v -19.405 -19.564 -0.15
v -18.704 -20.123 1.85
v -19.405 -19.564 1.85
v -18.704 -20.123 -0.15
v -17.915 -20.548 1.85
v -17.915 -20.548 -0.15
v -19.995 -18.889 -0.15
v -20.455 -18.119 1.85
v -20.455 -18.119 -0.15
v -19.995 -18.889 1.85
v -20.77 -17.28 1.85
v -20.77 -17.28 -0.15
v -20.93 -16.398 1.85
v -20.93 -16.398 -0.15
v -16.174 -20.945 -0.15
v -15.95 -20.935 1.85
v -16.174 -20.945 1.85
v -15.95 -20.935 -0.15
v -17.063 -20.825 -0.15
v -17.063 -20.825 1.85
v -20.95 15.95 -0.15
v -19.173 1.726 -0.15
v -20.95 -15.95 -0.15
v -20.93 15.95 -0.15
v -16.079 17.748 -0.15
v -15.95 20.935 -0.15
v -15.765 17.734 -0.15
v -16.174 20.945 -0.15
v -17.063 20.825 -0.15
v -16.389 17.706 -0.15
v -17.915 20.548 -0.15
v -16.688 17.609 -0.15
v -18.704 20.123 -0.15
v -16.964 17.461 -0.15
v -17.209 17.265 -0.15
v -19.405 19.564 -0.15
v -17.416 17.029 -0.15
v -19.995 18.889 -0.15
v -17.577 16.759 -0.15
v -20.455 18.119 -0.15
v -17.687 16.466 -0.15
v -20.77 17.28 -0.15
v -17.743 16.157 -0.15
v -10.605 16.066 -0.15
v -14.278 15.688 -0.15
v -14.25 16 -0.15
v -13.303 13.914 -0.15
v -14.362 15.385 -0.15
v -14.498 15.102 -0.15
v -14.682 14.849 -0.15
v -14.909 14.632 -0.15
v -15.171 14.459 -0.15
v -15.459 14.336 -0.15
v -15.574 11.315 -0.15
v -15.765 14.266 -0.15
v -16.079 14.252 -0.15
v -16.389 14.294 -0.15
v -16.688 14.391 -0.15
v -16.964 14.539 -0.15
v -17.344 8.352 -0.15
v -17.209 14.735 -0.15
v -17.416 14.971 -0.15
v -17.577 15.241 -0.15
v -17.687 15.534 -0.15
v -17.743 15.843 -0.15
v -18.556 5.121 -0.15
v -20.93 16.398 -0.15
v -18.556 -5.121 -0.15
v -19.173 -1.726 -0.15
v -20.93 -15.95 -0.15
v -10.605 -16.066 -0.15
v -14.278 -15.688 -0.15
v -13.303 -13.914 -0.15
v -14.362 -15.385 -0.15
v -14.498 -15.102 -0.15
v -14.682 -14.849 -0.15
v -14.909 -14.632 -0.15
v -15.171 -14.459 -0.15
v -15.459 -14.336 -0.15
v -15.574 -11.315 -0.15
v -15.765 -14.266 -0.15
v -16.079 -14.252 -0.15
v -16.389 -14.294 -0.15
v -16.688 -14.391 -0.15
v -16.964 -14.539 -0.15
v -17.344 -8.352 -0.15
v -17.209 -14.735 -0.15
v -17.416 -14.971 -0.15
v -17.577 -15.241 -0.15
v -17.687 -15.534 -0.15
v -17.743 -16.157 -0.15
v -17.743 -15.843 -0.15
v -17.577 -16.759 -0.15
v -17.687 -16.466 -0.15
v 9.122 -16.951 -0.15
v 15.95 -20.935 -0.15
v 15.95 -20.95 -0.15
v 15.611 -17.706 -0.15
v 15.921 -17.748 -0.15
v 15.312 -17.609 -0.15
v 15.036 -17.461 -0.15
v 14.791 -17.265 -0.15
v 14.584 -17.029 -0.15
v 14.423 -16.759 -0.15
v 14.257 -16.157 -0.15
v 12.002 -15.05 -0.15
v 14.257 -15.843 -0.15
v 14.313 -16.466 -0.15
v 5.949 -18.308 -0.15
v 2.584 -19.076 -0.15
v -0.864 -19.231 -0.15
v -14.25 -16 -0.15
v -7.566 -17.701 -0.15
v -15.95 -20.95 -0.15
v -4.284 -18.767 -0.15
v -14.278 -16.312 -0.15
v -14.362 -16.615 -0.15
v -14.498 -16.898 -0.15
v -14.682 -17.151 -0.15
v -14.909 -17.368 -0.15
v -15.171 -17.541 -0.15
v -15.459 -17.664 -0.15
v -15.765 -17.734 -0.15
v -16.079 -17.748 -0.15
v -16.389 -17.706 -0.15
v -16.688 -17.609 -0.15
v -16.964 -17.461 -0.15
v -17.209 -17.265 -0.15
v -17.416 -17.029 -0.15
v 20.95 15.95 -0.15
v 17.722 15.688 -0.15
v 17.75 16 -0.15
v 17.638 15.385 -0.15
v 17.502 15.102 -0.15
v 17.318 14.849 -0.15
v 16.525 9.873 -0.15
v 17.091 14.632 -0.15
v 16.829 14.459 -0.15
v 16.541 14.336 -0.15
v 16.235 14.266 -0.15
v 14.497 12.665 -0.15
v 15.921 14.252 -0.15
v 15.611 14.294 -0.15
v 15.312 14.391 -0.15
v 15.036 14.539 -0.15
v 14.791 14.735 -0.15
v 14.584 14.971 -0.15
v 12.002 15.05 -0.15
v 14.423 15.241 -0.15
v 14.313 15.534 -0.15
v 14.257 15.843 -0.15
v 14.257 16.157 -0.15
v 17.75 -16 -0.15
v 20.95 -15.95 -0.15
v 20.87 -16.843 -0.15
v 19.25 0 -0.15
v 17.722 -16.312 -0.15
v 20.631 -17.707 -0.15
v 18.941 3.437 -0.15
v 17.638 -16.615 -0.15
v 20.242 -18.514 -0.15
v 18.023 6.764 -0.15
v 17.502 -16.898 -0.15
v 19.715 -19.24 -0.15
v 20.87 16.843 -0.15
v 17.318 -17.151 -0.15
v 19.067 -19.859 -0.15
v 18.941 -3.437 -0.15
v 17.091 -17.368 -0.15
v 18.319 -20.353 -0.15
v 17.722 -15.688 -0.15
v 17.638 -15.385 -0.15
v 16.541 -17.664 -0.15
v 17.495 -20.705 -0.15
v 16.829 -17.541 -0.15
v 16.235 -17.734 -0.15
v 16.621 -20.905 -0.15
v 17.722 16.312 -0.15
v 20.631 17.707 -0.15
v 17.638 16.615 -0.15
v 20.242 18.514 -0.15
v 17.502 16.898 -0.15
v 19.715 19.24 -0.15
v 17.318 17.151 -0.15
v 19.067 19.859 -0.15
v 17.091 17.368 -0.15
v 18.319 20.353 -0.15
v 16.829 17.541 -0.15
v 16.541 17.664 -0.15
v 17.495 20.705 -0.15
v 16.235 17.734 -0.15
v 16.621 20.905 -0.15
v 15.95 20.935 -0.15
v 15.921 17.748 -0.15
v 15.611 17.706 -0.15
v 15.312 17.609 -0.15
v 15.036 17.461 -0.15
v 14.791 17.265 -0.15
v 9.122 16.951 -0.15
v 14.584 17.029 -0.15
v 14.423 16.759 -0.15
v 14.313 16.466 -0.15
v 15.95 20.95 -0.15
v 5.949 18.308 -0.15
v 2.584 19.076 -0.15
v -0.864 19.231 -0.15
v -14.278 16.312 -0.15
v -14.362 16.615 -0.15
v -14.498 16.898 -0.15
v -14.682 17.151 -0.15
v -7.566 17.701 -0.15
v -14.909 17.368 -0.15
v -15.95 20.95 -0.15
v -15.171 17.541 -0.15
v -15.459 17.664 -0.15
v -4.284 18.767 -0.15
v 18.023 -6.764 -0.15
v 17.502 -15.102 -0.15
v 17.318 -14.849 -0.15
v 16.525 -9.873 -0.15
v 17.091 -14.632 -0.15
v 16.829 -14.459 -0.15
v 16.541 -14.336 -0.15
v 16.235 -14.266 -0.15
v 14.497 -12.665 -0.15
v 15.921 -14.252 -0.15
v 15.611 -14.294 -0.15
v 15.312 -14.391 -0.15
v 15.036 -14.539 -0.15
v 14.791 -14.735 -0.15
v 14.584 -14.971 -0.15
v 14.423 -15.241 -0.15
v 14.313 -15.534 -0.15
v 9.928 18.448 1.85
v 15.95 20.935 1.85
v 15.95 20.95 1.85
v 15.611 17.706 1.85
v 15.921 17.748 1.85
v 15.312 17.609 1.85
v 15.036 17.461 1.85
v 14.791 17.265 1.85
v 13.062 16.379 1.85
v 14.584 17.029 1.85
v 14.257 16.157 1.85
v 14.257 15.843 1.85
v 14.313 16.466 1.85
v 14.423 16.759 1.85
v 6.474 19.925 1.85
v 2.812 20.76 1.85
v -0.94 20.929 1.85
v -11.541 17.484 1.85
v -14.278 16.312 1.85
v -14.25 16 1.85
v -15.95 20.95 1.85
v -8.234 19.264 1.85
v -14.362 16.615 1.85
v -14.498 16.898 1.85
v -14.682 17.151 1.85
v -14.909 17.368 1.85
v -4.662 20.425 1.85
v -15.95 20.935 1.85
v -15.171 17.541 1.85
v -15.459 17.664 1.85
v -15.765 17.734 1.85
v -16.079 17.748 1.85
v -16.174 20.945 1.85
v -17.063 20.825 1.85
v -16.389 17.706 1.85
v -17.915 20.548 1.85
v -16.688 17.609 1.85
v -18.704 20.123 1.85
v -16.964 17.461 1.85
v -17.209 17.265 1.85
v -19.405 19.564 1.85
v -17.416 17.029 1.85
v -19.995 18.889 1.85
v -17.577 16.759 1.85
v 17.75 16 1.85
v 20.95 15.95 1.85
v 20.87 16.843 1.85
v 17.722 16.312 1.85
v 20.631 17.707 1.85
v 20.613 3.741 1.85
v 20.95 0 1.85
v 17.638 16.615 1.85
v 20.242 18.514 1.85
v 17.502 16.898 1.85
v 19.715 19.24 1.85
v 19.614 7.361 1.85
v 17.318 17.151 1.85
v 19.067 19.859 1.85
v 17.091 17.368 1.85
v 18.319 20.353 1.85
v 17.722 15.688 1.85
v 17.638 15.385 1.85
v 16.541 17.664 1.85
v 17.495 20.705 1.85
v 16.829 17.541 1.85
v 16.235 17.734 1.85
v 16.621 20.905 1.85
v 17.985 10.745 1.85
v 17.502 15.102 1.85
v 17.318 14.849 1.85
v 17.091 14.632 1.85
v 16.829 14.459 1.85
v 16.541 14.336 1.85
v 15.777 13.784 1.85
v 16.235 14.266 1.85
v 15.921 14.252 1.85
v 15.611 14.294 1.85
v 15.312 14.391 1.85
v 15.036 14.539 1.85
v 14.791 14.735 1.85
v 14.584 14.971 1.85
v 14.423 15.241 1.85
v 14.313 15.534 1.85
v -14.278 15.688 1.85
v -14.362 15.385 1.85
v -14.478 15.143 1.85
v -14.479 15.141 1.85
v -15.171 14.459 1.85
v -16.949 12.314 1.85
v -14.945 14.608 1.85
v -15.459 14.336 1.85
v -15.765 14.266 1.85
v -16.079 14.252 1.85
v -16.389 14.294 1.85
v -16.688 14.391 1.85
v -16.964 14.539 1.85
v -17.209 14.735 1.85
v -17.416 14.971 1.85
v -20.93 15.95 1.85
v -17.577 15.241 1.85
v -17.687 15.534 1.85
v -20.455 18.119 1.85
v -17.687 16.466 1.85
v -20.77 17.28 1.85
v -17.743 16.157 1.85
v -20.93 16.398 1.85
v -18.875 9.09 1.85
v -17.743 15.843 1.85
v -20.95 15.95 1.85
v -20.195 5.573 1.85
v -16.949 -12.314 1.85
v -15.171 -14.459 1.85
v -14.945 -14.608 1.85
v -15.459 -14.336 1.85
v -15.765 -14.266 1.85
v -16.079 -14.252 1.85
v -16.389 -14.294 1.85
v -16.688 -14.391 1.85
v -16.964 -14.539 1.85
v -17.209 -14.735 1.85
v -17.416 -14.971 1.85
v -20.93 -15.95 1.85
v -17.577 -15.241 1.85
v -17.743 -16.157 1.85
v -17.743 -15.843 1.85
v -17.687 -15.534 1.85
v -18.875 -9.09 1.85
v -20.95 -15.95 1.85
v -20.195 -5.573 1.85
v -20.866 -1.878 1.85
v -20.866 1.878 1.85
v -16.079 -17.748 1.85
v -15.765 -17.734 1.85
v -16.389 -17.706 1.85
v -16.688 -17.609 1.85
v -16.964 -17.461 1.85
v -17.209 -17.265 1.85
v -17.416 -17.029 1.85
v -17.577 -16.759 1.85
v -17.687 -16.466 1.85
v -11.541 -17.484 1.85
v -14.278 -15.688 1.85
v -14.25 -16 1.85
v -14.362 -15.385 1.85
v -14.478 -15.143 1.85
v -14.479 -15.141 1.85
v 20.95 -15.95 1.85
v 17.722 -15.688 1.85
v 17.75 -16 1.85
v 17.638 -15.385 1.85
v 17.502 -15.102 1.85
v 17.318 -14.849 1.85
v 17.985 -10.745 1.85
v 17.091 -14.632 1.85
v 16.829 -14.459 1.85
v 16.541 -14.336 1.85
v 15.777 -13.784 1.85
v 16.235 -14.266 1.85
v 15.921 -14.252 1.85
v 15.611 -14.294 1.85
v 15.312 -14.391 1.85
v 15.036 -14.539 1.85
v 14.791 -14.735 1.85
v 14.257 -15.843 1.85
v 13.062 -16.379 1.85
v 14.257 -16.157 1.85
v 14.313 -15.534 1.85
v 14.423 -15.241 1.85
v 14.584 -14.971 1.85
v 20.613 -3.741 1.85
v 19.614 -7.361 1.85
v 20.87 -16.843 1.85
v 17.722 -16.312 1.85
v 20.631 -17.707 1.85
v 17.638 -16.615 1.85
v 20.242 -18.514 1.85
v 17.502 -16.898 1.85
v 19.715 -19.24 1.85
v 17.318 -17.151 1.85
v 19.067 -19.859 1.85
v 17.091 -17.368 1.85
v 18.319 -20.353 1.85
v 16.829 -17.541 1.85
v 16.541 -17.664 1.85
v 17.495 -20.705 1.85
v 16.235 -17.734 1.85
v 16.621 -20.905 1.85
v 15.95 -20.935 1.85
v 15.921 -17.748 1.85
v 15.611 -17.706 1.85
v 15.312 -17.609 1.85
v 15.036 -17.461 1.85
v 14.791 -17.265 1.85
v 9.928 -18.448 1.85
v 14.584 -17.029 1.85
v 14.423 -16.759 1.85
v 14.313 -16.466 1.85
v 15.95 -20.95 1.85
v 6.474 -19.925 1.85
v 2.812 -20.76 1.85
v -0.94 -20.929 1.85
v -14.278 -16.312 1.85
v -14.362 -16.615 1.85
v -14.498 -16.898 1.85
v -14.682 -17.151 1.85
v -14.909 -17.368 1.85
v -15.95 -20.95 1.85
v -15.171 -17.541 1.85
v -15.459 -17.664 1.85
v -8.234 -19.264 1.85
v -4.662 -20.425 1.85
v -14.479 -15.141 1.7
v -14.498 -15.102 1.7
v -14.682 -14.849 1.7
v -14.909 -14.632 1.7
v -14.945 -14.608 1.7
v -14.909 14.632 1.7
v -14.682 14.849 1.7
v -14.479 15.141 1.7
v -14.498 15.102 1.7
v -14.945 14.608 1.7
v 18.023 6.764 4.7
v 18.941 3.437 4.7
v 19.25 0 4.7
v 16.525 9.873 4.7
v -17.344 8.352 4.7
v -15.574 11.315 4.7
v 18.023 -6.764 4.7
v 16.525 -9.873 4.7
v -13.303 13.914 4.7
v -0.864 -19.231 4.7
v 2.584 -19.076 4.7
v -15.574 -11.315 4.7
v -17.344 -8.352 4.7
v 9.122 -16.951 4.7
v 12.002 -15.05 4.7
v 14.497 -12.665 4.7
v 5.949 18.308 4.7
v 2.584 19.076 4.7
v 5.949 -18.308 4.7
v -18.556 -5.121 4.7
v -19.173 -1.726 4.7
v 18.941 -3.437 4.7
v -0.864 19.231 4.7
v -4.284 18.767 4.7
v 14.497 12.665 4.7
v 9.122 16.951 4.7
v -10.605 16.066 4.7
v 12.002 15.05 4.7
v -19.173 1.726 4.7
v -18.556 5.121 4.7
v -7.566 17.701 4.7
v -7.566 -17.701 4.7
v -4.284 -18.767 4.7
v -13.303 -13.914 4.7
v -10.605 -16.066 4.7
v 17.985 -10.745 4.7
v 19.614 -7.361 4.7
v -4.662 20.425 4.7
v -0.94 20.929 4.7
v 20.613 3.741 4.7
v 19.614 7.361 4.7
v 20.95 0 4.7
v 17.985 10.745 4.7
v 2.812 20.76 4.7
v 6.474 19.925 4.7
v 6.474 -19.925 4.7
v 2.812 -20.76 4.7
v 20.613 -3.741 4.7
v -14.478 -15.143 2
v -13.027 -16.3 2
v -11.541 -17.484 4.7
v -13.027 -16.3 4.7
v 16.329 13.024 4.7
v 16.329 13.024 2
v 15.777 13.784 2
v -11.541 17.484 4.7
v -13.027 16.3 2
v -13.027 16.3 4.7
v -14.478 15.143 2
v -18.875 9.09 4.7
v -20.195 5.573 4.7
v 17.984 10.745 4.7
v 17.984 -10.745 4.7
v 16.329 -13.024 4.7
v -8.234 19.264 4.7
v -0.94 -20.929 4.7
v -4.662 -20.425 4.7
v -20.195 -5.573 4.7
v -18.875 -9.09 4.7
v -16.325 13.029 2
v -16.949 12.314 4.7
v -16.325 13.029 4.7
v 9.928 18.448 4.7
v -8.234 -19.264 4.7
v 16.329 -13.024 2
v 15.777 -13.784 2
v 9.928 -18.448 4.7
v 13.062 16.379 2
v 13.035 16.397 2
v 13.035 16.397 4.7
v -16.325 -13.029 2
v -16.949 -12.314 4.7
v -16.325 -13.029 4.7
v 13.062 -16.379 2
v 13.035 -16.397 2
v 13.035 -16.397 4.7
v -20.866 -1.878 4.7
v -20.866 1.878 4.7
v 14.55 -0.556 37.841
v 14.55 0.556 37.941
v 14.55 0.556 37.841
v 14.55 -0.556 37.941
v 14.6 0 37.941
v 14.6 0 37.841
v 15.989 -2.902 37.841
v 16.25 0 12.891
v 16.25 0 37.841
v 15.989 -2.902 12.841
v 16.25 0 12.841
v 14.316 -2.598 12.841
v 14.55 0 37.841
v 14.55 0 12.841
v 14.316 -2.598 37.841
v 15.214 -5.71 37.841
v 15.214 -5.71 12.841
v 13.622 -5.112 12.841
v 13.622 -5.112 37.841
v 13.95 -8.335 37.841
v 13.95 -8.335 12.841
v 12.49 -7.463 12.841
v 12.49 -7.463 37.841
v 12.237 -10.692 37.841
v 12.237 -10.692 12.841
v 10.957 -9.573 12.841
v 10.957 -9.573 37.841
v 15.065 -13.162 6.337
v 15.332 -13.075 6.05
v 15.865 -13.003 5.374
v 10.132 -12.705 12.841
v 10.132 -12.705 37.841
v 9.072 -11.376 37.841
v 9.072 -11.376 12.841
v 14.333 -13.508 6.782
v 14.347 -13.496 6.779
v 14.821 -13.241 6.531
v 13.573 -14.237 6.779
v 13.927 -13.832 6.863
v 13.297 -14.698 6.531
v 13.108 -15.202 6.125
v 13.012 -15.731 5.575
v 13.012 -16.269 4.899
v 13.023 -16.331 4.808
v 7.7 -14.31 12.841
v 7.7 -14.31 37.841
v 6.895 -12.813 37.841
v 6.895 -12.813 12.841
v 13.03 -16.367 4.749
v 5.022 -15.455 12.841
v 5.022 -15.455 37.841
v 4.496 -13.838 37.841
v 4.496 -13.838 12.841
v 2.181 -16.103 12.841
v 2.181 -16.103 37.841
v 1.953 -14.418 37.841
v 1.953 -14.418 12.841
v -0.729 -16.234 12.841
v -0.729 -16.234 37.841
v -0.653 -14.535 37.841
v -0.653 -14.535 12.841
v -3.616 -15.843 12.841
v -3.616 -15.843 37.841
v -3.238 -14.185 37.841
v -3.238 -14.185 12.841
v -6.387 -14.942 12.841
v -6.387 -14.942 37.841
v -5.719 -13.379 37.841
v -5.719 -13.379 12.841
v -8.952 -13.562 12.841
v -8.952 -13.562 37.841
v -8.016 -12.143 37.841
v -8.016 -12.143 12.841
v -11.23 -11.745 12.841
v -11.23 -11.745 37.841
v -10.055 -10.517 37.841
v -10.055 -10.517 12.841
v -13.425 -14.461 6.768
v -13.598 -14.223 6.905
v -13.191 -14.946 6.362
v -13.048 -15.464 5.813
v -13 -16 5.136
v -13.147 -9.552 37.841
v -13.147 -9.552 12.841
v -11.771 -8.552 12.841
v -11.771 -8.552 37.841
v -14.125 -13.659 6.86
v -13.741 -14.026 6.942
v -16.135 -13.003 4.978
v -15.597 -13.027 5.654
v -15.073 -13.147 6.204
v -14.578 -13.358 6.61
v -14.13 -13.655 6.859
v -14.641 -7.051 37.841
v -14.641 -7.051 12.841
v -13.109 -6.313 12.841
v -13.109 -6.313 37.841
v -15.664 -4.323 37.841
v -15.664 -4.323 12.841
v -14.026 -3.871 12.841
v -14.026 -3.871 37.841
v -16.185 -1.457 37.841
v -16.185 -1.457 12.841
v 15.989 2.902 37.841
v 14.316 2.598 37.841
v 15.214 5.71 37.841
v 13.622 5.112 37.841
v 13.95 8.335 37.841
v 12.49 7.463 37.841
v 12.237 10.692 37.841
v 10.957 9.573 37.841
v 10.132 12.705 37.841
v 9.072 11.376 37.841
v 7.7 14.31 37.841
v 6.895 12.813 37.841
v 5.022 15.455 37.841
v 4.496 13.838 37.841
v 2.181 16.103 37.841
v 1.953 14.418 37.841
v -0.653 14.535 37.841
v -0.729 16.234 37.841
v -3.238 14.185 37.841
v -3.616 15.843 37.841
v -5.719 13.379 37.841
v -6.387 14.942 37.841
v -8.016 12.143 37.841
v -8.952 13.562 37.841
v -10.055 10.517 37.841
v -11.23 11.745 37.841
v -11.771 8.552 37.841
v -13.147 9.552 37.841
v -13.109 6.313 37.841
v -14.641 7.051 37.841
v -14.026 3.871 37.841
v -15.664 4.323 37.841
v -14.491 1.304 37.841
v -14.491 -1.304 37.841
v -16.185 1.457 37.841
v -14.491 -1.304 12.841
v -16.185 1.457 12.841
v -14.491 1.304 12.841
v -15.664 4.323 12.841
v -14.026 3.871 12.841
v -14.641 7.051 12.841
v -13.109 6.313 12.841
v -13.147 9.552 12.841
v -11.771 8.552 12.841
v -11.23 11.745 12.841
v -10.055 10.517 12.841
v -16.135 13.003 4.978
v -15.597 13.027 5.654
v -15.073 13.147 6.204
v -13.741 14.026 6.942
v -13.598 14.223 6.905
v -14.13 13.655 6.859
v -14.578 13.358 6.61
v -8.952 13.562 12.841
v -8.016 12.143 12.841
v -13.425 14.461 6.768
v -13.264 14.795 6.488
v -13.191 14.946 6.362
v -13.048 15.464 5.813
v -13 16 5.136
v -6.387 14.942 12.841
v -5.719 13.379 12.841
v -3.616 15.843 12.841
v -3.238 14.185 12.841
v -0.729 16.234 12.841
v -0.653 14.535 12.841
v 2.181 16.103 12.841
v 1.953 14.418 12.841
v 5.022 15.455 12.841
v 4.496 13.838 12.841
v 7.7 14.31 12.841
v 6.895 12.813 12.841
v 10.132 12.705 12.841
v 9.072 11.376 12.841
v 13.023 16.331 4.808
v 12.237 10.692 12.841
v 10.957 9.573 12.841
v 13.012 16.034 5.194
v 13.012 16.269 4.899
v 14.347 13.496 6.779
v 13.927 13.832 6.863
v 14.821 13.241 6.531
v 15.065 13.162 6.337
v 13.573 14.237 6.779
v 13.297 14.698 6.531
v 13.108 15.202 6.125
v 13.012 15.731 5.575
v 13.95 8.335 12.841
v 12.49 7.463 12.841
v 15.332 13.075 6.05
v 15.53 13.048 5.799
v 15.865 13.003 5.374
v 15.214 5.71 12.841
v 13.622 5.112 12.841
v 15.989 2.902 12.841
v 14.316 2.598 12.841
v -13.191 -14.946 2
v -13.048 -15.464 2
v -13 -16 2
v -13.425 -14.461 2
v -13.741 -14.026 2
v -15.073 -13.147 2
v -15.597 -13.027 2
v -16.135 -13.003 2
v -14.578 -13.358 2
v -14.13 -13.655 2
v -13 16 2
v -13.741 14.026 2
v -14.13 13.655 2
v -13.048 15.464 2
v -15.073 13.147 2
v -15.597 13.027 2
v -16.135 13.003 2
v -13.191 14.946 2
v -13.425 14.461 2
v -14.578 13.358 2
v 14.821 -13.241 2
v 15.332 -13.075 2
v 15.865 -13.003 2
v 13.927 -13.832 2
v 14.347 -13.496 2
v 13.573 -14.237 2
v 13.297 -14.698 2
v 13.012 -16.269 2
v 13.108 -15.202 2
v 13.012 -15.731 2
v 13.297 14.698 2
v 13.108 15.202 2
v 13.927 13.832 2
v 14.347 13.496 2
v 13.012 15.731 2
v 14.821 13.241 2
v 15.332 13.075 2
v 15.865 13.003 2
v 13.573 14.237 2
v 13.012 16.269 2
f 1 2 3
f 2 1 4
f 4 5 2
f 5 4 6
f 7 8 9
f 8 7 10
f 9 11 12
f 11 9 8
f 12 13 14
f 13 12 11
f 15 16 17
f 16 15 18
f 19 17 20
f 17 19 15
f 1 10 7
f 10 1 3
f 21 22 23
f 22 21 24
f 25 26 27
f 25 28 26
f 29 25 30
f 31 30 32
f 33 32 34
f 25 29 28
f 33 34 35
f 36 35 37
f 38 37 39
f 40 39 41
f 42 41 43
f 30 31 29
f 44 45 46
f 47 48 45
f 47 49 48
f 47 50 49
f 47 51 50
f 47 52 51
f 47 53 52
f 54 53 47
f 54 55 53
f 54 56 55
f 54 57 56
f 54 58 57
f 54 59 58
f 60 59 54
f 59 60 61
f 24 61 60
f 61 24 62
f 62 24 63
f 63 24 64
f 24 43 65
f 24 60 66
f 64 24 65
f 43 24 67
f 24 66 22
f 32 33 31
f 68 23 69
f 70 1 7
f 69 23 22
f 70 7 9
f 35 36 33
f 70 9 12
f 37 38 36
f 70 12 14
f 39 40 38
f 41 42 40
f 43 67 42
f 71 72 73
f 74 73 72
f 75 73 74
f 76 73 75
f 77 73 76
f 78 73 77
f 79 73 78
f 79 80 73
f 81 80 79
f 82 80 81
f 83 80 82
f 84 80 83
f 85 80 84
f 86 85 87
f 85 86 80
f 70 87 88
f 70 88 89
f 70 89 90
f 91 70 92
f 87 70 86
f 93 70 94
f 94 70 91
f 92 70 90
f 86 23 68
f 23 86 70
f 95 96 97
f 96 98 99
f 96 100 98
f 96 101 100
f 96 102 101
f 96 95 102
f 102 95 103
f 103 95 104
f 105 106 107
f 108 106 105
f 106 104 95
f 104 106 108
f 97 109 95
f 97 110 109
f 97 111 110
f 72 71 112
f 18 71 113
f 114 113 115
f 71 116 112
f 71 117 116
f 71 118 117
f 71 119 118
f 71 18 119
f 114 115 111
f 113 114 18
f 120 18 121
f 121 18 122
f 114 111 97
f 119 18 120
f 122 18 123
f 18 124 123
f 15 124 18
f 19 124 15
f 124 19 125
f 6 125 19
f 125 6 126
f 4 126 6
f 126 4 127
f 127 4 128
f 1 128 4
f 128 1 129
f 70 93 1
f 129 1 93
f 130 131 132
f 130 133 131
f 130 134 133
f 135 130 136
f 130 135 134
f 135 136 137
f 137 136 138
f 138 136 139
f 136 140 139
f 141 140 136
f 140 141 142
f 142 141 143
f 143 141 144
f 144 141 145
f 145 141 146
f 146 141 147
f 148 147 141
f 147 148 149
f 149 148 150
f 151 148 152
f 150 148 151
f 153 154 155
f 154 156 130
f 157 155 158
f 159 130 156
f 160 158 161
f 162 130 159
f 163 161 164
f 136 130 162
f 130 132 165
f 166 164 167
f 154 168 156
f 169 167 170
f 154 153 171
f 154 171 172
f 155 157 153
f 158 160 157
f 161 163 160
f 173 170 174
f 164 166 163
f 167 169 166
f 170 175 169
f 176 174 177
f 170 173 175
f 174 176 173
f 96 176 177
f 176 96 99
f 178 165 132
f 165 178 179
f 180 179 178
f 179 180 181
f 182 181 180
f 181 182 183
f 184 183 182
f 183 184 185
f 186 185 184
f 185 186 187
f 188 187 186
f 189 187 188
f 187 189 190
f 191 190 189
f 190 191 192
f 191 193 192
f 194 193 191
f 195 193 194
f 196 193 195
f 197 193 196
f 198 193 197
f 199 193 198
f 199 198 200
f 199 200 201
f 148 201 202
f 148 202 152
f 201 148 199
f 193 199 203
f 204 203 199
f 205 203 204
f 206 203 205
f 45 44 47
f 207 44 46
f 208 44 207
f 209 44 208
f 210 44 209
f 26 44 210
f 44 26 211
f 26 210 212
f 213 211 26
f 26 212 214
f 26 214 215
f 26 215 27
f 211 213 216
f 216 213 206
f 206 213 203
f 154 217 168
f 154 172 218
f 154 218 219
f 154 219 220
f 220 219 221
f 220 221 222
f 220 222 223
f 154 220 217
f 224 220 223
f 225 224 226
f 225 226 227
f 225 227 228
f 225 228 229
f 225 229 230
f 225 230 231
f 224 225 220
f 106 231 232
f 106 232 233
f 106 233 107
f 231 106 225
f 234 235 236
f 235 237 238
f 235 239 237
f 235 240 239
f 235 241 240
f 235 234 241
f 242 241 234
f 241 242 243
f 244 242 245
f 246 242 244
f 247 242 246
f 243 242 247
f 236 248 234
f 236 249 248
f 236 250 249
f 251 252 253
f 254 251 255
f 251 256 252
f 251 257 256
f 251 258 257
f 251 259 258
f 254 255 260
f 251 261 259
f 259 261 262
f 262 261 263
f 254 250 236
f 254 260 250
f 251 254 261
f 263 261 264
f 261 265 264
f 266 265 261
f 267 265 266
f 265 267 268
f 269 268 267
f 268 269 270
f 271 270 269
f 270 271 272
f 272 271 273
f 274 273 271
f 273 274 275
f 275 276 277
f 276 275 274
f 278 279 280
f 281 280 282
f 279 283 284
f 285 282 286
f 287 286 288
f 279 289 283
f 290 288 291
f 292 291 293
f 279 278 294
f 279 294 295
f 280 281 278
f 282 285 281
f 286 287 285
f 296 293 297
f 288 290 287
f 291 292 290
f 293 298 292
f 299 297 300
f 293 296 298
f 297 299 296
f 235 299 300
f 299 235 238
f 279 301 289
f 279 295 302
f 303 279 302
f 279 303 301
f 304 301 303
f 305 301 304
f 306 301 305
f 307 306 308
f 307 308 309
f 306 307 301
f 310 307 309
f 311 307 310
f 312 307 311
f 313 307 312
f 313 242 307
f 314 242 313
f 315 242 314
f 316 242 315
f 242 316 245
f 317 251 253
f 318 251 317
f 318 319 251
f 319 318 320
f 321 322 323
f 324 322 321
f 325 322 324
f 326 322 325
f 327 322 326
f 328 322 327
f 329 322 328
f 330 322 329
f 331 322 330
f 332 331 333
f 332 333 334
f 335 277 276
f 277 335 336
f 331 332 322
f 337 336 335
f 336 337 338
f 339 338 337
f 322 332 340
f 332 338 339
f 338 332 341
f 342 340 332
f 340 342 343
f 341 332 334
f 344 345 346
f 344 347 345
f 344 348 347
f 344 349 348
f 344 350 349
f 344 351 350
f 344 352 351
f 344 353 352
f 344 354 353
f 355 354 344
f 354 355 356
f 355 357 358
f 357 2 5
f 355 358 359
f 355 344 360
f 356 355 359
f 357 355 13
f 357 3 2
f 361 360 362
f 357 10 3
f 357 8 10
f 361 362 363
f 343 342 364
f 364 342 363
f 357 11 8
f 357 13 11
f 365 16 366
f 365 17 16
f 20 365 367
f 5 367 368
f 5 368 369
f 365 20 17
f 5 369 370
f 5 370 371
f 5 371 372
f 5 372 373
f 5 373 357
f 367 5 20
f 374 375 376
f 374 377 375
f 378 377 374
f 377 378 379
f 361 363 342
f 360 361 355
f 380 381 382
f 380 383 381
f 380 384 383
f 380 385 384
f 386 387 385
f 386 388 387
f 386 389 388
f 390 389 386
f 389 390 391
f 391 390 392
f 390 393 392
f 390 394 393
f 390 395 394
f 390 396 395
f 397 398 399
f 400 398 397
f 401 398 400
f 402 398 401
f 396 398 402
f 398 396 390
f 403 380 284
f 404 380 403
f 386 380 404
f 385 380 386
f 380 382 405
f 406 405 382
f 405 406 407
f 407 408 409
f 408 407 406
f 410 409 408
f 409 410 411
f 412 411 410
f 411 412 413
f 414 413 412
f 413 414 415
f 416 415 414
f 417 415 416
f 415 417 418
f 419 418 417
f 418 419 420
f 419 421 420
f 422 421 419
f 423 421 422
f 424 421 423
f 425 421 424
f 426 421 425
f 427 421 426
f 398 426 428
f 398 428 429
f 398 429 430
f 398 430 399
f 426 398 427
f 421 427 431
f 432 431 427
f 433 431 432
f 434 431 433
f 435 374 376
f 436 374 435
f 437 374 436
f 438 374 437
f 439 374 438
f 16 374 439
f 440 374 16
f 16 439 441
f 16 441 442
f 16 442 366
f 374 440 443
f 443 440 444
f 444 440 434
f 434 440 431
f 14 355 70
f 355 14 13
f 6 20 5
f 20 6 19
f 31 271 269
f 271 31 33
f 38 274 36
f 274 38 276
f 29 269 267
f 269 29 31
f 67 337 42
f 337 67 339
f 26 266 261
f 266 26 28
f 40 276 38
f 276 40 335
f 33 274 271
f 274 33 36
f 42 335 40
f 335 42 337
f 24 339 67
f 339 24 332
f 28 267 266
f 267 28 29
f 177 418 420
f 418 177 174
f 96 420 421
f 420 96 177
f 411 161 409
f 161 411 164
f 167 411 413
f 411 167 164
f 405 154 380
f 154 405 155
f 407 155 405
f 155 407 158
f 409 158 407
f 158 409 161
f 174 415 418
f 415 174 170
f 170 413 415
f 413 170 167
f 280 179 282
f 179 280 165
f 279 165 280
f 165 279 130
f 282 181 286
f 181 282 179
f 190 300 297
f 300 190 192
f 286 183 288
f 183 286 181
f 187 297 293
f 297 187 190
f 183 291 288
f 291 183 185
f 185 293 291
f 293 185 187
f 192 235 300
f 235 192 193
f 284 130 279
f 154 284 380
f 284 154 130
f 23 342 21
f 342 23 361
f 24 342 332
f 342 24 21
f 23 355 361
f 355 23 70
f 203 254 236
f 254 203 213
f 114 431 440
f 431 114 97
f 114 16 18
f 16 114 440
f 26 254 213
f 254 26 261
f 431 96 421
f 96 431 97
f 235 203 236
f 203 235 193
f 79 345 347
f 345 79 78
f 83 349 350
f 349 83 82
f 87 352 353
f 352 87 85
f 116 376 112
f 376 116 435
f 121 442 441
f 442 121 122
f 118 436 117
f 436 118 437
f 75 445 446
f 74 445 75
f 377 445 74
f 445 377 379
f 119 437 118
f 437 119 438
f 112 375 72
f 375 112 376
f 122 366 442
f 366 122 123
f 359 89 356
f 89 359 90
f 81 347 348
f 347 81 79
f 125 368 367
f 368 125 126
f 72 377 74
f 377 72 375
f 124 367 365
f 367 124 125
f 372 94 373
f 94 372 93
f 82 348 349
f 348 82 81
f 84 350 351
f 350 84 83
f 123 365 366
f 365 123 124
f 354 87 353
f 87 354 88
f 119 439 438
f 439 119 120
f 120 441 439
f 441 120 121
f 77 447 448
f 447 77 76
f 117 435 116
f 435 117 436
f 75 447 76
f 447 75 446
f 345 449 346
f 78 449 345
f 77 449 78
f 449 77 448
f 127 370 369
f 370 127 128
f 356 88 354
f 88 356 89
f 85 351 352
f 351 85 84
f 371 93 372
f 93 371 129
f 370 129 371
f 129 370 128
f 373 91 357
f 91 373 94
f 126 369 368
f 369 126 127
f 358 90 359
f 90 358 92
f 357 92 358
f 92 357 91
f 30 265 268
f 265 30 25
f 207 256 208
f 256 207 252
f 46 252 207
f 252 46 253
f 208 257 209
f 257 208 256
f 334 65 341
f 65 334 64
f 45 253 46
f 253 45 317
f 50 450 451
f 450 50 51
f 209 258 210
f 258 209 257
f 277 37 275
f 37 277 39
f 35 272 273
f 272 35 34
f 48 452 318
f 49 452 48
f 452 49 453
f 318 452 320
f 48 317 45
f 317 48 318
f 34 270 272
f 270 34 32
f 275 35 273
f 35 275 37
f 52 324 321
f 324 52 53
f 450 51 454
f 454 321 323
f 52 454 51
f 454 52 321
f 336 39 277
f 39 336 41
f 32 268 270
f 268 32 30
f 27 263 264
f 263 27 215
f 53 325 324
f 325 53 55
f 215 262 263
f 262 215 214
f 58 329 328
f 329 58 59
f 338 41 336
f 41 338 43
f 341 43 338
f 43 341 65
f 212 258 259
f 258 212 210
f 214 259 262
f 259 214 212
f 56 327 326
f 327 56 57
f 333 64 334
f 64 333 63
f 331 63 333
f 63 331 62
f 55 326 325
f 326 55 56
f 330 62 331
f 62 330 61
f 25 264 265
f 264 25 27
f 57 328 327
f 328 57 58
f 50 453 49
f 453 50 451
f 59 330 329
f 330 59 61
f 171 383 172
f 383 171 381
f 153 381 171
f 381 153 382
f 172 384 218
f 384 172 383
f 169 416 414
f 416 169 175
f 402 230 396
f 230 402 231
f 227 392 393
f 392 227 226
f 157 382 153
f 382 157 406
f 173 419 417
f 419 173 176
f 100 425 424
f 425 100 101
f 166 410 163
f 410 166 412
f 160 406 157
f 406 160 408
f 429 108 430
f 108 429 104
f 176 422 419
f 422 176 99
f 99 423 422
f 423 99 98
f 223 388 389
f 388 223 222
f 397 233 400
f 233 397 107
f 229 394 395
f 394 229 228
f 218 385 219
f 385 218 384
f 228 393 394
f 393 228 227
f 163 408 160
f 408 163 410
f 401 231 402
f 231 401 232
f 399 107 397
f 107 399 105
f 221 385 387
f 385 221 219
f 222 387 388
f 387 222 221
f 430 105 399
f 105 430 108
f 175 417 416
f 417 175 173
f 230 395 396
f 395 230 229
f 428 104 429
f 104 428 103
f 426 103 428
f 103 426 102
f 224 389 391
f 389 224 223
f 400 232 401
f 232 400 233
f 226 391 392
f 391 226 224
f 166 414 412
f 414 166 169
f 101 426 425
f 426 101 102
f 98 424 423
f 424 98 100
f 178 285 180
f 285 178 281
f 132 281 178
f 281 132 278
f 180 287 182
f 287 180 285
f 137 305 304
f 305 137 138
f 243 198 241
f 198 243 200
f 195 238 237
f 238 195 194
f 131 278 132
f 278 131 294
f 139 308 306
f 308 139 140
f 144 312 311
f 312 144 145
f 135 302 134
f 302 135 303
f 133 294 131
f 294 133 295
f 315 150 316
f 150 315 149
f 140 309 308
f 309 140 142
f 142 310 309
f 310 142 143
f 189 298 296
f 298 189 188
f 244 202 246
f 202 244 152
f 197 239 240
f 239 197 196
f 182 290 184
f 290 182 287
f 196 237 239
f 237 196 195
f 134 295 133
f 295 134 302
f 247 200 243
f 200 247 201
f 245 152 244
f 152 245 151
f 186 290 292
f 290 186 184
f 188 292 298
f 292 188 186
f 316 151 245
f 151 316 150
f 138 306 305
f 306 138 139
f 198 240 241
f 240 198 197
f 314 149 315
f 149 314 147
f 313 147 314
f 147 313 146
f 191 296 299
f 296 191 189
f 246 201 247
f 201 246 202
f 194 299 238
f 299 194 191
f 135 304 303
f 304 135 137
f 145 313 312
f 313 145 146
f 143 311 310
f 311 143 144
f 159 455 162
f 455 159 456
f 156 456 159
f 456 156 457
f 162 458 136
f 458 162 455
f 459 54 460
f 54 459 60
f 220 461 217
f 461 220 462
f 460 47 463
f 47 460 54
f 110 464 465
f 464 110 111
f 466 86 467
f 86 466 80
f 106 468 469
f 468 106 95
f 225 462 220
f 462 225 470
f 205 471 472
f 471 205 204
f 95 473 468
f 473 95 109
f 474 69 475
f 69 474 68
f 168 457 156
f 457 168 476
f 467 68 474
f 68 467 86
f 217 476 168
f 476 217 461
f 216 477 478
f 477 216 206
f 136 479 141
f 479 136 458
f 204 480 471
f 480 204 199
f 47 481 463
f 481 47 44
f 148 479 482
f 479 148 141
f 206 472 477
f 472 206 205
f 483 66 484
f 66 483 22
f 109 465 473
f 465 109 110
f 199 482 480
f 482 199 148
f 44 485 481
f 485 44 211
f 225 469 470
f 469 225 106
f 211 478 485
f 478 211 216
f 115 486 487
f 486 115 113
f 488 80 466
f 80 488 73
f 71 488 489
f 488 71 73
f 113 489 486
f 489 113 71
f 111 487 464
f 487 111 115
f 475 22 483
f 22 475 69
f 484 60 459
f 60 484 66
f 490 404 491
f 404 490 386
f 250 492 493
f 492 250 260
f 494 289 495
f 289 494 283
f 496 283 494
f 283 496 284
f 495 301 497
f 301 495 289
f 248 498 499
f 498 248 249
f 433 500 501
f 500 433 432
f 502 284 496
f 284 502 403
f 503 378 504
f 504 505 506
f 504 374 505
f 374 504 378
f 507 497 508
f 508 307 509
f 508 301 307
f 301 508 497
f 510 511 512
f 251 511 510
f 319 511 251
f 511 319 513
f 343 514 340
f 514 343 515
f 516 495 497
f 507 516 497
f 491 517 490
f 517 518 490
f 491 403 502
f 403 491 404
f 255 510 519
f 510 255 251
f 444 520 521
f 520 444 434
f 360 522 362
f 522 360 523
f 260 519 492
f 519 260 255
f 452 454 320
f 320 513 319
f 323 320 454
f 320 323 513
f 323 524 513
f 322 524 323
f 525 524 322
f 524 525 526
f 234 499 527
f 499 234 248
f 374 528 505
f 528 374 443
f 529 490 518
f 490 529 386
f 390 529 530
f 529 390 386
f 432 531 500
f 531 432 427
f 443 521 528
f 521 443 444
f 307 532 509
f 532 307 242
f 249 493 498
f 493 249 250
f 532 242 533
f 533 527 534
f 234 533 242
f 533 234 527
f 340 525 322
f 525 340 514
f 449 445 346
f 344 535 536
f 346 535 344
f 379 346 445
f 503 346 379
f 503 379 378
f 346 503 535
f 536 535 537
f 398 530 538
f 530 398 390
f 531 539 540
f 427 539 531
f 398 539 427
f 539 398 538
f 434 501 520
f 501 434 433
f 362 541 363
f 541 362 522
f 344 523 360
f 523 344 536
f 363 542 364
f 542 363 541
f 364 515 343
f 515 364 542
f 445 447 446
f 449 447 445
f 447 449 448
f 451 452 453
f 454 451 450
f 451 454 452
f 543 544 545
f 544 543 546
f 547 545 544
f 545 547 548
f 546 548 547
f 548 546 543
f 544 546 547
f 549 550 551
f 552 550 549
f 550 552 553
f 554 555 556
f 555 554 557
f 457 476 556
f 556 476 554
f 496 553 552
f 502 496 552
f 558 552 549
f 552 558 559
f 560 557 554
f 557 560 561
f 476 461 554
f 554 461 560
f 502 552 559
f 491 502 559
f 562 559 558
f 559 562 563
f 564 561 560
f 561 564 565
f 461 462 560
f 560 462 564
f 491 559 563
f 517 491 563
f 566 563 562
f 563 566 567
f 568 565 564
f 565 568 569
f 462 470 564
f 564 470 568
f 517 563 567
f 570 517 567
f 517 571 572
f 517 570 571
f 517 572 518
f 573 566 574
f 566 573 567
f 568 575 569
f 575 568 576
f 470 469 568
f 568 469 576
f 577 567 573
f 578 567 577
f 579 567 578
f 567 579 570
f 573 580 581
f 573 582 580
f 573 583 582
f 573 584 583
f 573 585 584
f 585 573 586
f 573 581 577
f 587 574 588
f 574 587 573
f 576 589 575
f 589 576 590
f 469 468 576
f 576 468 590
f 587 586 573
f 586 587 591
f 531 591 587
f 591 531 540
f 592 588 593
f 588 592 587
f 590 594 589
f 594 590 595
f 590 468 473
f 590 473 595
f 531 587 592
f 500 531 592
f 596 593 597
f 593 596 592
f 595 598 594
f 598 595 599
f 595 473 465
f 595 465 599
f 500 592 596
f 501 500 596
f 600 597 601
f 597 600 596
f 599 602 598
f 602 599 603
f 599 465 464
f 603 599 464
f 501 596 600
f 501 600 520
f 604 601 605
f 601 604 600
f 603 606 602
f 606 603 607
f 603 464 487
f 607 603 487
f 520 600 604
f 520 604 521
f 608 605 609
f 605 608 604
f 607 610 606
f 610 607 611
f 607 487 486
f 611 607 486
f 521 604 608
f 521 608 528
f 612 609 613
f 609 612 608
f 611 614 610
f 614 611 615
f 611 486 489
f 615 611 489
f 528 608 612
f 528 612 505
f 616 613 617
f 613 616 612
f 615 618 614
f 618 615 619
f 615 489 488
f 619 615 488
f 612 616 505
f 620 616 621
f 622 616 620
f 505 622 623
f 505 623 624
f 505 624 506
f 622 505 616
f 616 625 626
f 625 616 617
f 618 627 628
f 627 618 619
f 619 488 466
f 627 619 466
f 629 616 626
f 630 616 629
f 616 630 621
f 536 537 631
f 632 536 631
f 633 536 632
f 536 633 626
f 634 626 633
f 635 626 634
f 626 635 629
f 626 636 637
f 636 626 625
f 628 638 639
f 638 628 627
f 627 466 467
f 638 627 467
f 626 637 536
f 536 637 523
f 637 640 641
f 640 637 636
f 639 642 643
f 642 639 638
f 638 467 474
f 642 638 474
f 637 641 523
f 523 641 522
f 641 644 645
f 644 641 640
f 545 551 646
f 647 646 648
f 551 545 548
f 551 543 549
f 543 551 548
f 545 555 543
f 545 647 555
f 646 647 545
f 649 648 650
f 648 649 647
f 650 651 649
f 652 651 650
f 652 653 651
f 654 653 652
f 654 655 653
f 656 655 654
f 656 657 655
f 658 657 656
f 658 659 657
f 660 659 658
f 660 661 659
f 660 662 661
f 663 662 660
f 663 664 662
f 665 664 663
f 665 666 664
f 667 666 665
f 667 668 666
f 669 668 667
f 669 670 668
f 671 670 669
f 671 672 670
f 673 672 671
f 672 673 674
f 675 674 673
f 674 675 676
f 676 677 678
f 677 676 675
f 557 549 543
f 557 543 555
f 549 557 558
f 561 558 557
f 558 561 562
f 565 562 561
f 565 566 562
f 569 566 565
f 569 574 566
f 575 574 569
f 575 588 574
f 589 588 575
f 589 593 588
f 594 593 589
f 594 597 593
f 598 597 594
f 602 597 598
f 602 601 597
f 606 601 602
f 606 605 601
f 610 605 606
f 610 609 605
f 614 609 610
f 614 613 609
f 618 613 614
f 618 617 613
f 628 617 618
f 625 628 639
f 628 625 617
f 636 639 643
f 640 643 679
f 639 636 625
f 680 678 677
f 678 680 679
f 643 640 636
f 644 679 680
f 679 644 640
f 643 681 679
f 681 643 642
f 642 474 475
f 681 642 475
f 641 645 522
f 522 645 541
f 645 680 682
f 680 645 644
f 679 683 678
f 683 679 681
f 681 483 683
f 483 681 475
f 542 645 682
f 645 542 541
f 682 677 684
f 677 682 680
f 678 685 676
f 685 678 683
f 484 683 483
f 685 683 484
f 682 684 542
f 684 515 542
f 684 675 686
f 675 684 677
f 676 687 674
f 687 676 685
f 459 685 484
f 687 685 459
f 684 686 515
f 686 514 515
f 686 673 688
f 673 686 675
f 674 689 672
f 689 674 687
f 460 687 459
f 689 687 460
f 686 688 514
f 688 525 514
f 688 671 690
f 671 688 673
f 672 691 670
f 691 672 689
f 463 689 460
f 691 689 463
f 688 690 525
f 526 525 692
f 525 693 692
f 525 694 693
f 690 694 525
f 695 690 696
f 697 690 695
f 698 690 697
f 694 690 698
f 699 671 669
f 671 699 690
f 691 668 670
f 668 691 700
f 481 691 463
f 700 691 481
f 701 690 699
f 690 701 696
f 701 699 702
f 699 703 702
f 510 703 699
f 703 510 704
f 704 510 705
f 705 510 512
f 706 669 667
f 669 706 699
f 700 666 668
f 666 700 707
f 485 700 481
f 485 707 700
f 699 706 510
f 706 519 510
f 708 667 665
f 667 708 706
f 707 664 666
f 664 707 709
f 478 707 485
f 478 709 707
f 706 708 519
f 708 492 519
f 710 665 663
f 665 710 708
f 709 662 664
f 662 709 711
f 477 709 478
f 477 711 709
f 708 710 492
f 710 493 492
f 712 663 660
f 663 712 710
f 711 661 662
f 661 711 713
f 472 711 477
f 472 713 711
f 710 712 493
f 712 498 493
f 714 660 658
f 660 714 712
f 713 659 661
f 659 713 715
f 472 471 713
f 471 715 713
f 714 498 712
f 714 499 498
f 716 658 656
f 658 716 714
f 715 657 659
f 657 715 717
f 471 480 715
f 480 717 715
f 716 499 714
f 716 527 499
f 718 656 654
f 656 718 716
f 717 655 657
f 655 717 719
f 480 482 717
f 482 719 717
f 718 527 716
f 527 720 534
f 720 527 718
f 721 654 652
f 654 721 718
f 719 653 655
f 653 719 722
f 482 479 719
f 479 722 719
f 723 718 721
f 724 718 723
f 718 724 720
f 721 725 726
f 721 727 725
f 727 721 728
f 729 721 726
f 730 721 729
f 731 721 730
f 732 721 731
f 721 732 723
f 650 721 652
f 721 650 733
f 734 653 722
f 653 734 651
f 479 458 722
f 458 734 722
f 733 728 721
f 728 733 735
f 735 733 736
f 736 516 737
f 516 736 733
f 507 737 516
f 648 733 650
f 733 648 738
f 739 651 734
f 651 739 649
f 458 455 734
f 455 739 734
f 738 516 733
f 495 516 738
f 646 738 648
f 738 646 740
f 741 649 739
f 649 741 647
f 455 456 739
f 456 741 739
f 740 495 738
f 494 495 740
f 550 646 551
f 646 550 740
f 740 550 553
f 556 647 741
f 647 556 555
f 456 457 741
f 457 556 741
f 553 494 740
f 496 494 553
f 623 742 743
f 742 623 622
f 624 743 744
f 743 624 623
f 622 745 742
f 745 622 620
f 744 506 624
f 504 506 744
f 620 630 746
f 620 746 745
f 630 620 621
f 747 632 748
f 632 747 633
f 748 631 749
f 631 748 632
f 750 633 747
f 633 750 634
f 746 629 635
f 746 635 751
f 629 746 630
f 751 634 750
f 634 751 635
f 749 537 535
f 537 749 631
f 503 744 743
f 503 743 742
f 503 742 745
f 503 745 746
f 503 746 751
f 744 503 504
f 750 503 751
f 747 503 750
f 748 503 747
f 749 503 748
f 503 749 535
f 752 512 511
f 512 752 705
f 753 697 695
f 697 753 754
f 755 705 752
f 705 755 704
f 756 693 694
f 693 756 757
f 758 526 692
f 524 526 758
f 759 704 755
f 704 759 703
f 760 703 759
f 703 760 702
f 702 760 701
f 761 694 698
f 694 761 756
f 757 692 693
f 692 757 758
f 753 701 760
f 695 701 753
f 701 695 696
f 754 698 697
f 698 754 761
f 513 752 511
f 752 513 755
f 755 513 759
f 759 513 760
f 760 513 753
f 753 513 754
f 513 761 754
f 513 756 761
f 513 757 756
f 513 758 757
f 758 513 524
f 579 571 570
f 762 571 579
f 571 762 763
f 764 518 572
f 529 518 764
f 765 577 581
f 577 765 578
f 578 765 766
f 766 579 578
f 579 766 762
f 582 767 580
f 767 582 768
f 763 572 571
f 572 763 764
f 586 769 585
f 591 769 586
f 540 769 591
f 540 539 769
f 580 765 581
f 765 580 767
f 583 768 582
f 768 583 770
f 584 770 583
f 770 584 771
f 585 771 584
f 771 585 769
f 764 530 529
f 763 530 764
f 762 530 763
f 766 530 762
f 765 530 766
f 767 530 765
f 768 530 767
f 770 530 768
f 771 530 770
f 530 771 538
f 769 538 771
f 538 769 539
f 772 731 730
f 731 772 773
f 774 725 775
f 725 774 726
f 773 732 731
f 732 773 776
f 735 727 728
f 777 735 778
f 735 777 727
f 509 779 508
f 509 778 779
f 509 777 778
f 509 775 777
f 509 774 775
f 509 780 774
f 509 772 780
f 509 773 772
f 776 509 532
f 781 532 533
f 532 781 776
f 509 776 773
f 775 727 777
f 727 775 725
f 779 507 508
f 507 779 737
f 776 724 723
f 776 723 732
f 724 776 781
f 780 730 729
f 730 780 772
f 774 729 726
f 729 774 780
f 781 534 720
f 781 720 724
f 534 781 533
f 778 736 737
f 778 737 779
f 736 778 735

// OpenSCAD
// [FL_INDEX: keywords="openscad, 3d_parametric, Tube_Adapter_Flange_with_Optional_Grating__Parametric, csg_solid" | COT="Parametric OpenSCAD design from 3DCodeverse"]
// Title: Tube Adapter Flange with Optional Grating (Parametric)

/*
 * Tube Adapter Flange with Grating (Parametric), v1.00
 *
 * by Alex Franke (CodeCreations), Dec 2012
 * http://www.theFrankes.com
 * 
 * Licenced under Creative Commons Attribution - Non-Commercial - Share Alike 3.0 
 * 
 * DESCRIPTION: This allows you to cover a hole with a specific diameter (with optional 
 *   grating) and then attach a hose of a different diameter. For example, if you're creating
 *   an exhaust vent for a 40mm fan to push air out through a 1.25-inch tube, then you can 
 *   render this file with a 40mm input diameter and a 1.25-inch output diameter. The angle
 *   of the transition is configurable to ensure good prints. 
 * 
 * INSTRUCTIONS:  Choose some values in the "User-defined values" section, render,
 *   and print. See the comments in that section for details on how to measure. 
 * 
 * v1.00, Mar 1, 2014: Added pinch angles, flange thickness, end rounding.
 * v0.42, Dec 20, 2012: Initial Release.
 * 
 * TODO: 
 *   * None at this time
 */

/////////////////////////////////////////////////////////////////////////////
// User-defined values... 
/////////////////////////////////////////////////////////////////////////////

roundRadius       = 5;    // The radius of the rounding on the corners
thickness         = 1.7;  // The thickness of the material (tube) 
flangeThickness   = 2.0;  // The thickness of the flange
holeDistance      = 32;   // The distance on center between the mounting holes on each side  
holeDiameter      = 3.5;  // The diameter of the mounting holes 

boltHeadDiameter  = 6;    // The diameter of the bolt head (so it doesn't interfere with the tube) 

angle             = 60;   // The angle of the transition between diameters

inputTubeLength   = 3;    // The length the input diameter will extend straight before the transition.  
inputDiameter     = 38.5; // The inner diameter (ID) of the input hole
outputLength      = 25;   // The length of the output diameter after the transition. 
outputDiameter    = 29.1; // The inner diameter (ID) of the output flange. 

meshLines         = 0;    // The number of mesh lines (grates) to render (zero for none) 
meshWidth         = 0;    // The width of the mesh material (grates) 
meshHeight        = 0;    // The thickness of the mesh material (grates)

optimizeThickness = true; // true to optimize transition thickness for FDM printing (a bit thinner), 
                          //   or false for consistent thickness 

pinchAngle1       = 90;   // The angle to pinch the output tube from one side
pinchAngle2       = 90;   // ...and from the other side 
tipCutRadius      = 0;    // The radius to round in the tip
tipCutInset       = 0;    // The distance to cut into the tip 

$fn               = 35;   // general curve quality

silliness         = 0.05; // Allows OpenSCAD to create good models 


/////////////////////////////////////////////////////////////////////////////
// Some calculated values and helpful output... 
/////////////////////////////////////////////////////////////////////////////

dx = (inputDiameter - outputDiameter)/2; 
height = dx*tan(angle);
yOffset = (thickness*tan(angle/2));
xOffset = yOffset*tan(angle);
totalHeight = inputTubeLength + outputLength + height; 

echo( str( "Outer diameter of output flange is ", outputDiameter+thickness*2, " mm or ",
	(outputDiameter+thickness*2)/25.4, " in.") ); 
echo( str( "Inner diameter of output flange is ", outputDiameter, " mm or ",
	outputDiameter/25.4, " in.") ); 
echo( str( "Total height is ", totalHeight, " mm or ",
	totalHeight/25.4, " in.") ); 


/////////////////////////////////////////////////////////////////////////////
// The code...
/////////////////////////////////////////////////////////////////////////////

difference() {
	union() {
		translate([0,0,thickness/2]) 
			base(); 
		translate([0,0,inputTubeLength/2+thickness]) 
			lowerTube(); 
		translate([0,0,thickness+inputTubeLength]) 
			cone(); 
	}

	// Carve some space for the mounting bolts. 
	translate([0,0,totalHeight/2+flangeThickness+0.5]) 
	for(x=[-1,1], y=[-1,1]) {
		translate([holeDistance/2*x,holeDistance/2*y,0]) 
			cylinder(h=totalHeight+1,r=boltHeadDiameter/2, center=true);
	}
}


/////////////////////////////////////////////////////////////////////////////
// The modules...
/////////////////////////////////////////////////////////////////////////////

// Comment out the "module" line and the "}" at the end to use these settings. 
// This is likely suitable for connecting a 40mm fan to a 1.25" tube.
module example1() {
	roundRadius       = 5;
	thickness         = 1.7;
	holeDistance      = 32;
	holeDiameter      = 3.5;
	
	boltHeadDiameter  = 6;
	
	angle             = 60;
	
	inputTubeLength   = 3;
	inputDiameter     = 38.5;
	outputLength      = 15;
	outputDiameter    = (1.28*25.4)-thickness*2;
	
	meshLines         = 0;
	meshWidth         = 0;
	meshHeight        = 0;
	
	optimizeThickness = true;
}

// Comment out the "module" line and the "}" at the end to use these settings. 
// This is likely suitable for connecting a 1.25" tube to cover a 1 1/8" - 1 1/4" hole.
module example2() {
	roundRadius       = 3;
	thickness         = 1.7;
	holeDistance      = 27;
	holeDiameter      = 3.5;
	
	boltHeadDiameter  = 6;
	
	angle             = 60;
	
	inputTubeLength   = 3;
	inputDiameter     = 30;
	outputLength      = 15;
	outputDiameter    = (1.28*25.4)-thickness*2;
	
	meshLines         = 7;
	meshWidth         = 0.8;
	meshHeight        = 1;
	
	optimizeThickness = true;
}

// Comment out the "module" line and the "}" at the end to use these settings. 
// This is likely suitable for connecting a 80mm fan to a 1 1/4" tube.
module example3() {
	roundRadius       = 3;
	thickness         = 1.7;
	holeDistance      = 71.6;
	holeDiameter      = 3.5;
	
	boltHeadDiameter  = 6;
	
	angle             = 60;
	
	inputTubeLength   = 3;
	inputDiameter     = 76;
	outputLength      = 15;
	outputDiameter    = (1.28*25.4)-thickness*2;
	
	meshLines         = 0;
	meshWidth         = 0;
	meshHeight        = 0;
	
	optimizeThickness = true;
}

// Comment out the "module" line and the "}" at the end to use these settings. 
// This makes a nice 40mm fan shroud.
module example4() {
	roundRadius       = 3;
	thickness         = 0.5;
 	flangeThickness   = 1; 
	holeDistance      = 32;
	holeDiameter      = 3.5;
	
	boltHeadDiameter  = 6;
	
	angle             = 68;
	
	inputTubeLength   = 1;
	inputDiameter     = 37;
	outputLength      = 12;
	outputDiameter    = 14;
	
	meshLines         = 0;
	meshWidth         = 0;
	meshHeight        = 0;
	
	optimizeThickness = true;

	pinchAngle1       = 60; 
	pinchAngle2       = 70;
	tipCutRadius      = 12; 
	tipCutInset       = 1.5; 
}


module cone() {
	
	y = optimizeThickness ? 0 : yOffset; 

	difference() { 

		union() {
			rotate([0,0,180]) // line up the edges 
			rotate_extrude(convexity=5)
			polygon(points=[
				[inputDiameter/2+thickness,0],
				[outputDiameter/2+thickness,height],
				[outputDiameter/2+thickness,height+outputLength],
				[outputDiameter/2,height+outputLength],
				[outputDiameter/2,height-y],
				[inputDiameter/2,0-y]
			]);
		
			translate([0,0,silliness]) 
			intersection() {
				union() {
					translate([outputDiameter/2,-(outputDiameter+1)/2,height]) 
						rotate([0,-90+pinchAngle1,0]) 
							cube([thickness,outputDiameter+1,outputLength*2]); 
					translate([-outputDiameter/2-thickness,-(outputDiameter+1)/2,height]) 
						rotate([0,90-pinchAngle2,0]) 
							cube([thickness,outputDiameter+1,outputLength*2]); 
				}
				translate([0,0,height+silliness]) 
					cylinder(h=outputLength, r=outputDiameter/2+silliness); 
			}
		}

		// clean up the pinches 
		translate([outputDiameter/2+thickness,-(outputDiameter+thickness*2+1)/2,height+silliness]) 
			rotate([0,-90+pinchAngle1,0]) 
				cube([outputDiameter,outputDiameter+thickness*2+1,outputLength*2]); 
		translate([-outputDiameter/2-thickness,-(outputDiameter+thickness*2+1)/2,height+silliness]) 
			rotate([0,90-pinchAngle2,0]) 
				translate([-outputDiameter,0,0]) 
				cube([outputDiameter,outputDiameter+thickness*2+1,outputLength*2]);

		// Cut a radius into the tip
		translate([0,0,height+outputLength+tipCutRadius-tipCutInset]) 
			rotate([0,90,0])  	
				cylinder(r=tipCutRadius, h=outputDiameter+thickness*2+1, center=true); 	

	}
}

module lowerTube() {
	difference() {
		cylinder(h=inputTubeLength, r=inputDiameter/2+thickness, center=true);
		cylinder(h=inputTubeLength+1, r=inputDiameter/2, center=true);
	}
}

module base() {
	wid = max( inputDiameter + thickness*2, holeDistance + boltHeadDiameter); 
	dist = wid/2-roundRadius; 
	// meshLines = ( inputDiameter + thickness*2 - meshSize ) / ( meshWidth + meshSize );
	meshDistance = ( wid-meshWidth*meshLines ) / (meshLines+1); 


	echo( str( "Mesh hole size ", meshWidth + meshDistance, " mm" ) ); 

	union() {

		difference() {
			union() {
				for(x=[-1,1], y=[-1,1]) {
					translate([dist*x,dist*y,0]) 
						cylinder(h=flangeThickness, r=roundRadius, center=true); 
				}
				for(r=[0,90]) {
					rotate([0,0,r]) 
						cube([wid,wid-roundRadius*2,flangeThickness], 
							center=true);
				}
			}
	
			// Mounting holes 
			for(x=[-1,1], y=[-1,1]) {
				translate([holeDistance/2*x,holeDistance/2*y,0]) 
					cylinder(h=flangeThickness+1,r=holeDiameter/2, center=true);
			}
	
			// Input hole 
			cylinder(h=thickness+1,r=inputDiameter/2, center=true);
		}

		// mesh
		if ( meshLines > 0 ) {
			intersection() {
				cylinder(h=thickness+1,r=inputDiameter/2, center=true);

				translate([-wid/2,-wid/2,-thickness/2]) {
					for(x=[0:meshLines-1]) 
						translate([meshDistance+x*(meshWidth + meshDistance),0,0]) {
							cube([meshWidth,wid,meshHeight]); 
						}
		
					for(y=[0:meshLines-1]) 
						translate([0,meshDistance+y*(meshWidth + meshDistance),0]) {
							cube([wid,meshWidth,meshHeight]); 
						}
				}
			}
		}
	}
}
